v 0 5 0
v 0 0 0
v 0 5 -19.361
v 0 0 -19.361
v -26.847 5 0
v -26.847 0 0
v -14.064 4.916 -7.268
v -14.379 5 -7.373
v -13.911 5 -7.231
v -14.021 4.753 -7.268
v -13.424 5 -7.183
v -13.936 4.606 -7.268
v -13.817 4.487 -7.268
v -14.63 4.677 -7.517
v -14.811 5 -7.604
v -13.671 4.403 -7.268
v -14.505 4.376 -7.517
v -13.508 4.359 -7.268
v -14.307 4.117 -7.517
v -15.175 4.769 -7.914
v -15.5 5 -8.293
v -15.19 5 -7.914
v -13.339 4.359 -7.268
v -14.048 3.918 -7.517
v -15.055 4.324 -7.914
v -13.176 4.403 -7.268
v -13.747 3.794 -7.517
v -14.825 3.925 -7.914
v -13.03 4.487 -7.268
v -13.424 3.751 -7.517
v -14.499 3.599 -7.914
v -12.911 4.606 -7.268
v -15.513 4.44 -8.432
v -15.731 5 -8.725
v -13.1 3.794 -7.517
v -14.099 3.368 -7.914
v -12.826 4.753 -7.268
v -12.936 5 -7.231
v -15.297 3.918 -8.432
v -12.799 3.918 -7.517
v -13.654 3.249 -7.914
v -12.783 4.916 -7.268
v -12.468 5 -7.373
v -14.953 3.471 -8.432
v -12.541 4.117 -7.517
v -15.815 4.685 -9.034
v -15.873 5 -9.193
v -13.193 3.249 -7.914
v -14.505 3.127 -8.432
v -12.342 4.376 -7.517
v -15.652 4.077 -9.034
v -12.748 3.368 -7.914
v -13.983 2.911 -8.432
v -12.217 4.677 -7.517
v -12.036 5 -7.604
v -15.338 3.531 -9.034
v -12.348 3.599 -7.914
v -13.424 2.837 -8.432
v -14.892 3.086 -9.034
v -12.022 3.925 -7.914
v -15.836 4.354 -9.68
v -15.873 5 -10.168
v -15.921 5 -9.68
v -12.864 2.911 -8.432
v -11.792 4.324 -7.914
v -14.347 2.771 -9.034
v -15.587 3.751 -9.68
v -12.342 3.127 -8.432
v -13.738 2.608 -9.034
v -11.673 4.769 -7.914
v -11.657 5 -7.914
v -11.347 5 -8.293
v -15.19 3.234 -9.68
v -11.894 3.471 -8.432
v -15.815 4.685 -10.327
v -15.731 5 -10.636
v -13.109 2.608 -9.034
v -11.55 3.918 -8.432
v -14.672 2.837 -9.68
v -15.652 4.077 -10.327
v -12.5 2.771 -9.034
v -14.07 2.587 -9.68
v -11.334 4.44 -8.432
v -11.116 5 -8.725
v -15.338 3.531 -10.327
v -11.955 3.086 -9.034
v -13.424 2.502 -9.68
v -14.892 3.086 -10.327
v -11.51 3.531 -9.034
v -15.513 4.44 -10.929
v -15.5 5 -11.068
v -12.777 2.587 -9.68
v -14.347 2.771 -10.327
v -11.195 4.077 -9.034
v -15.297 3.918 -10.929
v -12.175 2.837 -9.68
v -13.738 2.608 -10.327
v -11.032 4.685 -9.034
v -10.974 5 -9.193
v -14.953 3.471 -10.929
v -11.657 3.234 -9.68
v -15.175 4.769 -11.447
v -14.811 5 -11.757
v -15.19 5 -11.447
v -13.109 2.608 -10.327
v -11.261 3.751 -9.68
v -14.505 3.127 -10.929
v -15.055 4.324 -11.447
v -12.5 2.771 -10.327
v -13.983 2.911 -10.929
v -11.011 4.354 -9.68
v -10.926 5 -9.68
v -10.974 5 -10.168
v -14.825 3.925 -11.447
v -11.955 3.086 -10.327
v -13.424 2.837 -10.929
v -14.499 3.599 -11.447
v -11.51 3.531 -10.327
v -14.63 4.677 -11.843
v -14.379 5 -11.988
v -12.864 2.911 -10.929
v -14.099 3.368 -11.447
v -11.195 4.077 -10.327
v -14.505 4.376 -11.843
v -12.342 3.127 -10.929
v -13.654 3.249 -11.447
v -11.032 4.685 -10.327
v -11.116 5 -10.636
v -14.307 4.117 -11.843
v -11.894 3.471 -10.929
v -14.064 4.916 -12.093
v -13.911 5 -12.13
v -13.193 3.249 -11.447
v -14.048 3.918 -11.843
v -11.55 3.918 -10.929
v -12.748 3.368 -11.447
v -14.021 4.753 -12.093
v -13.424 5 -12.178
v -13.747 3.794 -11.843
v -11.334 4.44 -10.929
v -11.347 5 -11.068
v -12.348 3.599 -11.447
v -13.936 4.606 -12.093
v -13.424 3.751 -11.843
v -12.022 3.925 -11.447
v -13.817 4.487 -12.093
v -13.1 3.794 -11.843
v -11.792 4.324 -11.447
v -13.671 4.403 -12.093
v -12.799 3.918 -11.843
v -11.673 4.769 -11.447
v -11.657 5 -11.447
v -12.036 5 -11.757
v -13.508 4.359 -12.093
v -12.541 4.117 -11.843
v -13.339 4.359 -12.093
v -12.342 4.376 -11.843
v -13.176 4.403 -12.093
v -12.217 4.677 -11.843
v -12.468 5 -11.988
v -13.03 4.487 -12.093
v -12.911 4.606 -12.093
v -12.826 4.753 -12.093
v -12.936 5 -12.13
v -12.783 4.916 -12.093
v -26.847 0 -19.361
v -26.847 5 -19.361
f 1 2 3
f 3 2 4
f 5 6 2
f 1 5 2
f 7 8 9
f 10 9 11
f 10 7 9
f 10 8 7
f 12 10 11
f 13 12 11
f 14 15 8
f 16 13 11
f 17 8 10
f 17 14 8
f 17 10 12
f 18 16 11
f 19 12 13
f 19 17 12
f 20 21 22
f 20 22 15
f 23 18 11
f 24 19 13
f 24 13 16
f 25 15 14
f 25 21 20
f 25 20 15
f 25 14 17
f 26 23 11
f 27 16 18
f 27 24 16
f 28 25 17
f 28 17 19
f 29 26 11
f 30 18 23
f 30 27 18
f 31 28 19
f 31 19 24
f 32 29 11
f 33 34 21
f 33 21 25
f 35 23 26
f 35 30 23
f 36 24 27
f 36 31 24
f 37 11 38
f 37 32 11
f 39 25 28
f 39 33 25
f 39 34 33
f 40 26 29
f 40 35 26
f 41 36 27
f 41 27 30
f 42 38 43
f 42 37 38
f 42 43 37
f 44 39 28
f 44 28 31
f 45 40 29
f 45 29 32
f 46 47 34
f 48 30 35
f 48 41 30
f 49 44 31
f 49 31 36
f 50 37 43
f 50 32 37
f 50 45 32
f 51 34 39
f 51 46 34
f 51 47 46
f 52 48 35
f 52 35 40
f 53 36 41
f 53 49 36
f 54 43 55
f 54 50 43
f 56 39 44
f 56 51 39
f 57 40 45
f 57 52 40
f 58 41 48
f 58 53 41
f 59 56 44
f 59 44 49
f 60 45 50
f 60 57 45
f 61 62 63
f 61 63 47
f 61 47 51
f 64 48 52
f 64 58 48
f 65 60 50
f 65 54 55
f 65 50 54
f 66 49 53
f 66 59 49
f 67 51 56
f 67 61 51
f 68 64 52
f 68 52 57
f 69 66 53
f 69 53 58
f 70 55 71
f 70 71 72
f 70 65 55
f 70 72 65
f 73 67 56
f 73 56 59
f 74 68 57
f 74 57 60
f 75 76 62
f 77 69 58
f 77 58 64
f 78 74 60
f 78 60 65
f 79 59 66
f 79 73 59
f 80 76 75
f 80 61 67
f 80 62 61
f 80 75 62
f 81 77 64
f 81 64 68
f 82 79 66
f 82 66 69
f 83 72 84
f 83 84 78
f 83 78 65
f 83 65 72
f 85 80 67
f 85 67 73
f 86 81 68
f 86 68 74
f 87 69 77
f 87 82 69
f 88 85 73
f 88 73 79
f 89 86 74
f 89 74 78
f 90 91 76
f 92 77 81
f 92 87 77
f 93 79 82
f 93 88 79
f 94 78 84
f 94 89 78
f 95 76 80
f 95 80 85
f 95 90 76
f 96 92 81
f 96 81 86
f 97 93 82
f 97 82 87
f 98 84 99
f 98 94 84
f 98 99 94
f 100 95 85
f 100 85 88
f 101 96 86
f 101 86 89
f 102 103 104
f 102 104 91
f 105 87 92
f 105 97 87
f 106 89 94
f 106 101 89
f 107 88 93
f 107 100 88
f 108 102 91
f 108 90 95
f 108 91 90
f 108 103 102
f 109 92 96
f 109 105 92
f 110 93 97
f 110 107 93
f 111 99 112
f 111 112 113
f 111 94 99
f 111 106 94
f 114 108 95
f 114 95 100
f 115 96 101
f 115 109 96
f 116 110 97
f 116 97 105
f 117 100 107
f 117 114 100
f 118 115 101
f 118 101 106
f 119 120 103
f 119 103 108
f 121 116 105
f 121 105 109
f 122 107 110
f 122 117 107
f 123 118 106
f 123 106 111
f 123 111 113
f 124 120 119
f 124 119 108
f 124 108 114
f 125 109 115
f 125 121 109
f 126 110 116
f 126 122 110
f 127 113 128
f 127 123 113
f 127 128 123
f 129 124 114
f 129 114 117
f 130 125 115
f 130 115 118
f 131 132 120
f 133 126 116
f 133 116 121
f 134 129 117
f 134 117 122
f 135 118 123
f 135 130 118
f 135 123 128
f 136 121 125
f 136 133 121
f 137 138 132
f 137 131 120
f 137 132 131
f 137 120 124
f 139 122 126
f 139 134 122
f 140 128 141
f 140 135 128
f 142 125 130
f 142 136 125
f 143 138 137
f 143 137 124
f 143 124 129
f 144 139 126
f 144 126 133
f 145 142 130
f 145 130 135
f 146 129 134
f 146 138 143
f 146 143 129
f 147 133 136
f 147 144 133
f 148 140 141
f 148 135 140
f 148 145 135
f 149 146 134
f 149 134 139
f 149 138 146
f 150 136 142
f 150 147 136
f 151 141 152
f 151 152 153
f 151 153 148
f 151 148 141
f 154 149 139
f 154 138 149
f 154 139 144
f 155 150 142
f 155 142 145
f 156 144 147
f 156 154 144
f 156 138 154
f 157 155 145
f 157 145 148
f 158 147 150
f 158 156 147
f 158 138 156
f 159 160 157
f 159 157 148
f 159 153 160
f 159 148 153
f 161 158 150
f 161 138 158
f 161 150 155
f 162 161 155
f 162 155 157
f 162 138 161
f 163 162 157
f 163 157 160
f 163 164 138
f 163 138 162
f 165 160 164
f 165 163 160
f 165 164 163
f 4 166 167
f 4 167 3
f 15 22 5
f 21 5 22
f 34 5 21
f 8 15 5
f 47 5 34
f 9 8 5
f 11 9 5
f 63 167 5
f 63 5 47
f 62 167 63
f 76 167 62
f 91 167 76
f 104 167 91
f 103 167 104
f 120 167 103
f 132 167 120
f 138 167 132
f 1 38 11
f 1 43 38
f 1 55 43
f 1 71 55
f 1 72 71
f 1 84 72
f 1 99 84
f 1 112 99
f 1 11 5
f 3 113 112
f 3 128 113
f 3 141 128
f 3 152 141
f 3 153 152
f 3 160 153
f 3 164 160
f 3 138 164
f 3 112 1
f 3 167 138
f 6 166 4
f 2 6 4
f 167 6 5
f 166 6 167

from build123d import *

# Parameters (mm, degrees)
ESQUISSE1_W        = 26.847127718
ESQUISSE1_H        = 19.360909412
BOSS_EXTRU_1_DEPTH = 5


with BuildPart() as part:
    # Esquisse1 → Boss.-Extru.1 (new body)
    with BuildSketch(Plane(origin=(0, 0, 0), x_dir=(1, 0, 0), z_dir=(0, 1, 0))):
        with Locations((-13.423563859, 9.680454706)):
            Rectangle(ESQUISSE1_W, ESQUISSE1_H)
    extrude(amount=BOSS_EXTRU_1_DEPTH)

    # Esquisse2 → Enlèvement de matière-Révolution1 (revolve, cut)
    with BuildSketch(Plane(origin=(0, 5, 0), x_dir=(1, 0, 0), z_dir=(0, 1, 0))):
        with BuildLine():
            Line((-13.423563859, 12.17807818), (-13.423563859, 7.182831232))
            ThreePointArc((-13.423563859, 7.182831232), (-10.925940385, 9.680454706), (-13.423563859, 12.17807818))
        make_face()
    revolve(axis=Axis((-13.423563859, 5, -17.260196432), (0, 0, 1)), mode=Mode.SUBTRACT)


solid = part.part
